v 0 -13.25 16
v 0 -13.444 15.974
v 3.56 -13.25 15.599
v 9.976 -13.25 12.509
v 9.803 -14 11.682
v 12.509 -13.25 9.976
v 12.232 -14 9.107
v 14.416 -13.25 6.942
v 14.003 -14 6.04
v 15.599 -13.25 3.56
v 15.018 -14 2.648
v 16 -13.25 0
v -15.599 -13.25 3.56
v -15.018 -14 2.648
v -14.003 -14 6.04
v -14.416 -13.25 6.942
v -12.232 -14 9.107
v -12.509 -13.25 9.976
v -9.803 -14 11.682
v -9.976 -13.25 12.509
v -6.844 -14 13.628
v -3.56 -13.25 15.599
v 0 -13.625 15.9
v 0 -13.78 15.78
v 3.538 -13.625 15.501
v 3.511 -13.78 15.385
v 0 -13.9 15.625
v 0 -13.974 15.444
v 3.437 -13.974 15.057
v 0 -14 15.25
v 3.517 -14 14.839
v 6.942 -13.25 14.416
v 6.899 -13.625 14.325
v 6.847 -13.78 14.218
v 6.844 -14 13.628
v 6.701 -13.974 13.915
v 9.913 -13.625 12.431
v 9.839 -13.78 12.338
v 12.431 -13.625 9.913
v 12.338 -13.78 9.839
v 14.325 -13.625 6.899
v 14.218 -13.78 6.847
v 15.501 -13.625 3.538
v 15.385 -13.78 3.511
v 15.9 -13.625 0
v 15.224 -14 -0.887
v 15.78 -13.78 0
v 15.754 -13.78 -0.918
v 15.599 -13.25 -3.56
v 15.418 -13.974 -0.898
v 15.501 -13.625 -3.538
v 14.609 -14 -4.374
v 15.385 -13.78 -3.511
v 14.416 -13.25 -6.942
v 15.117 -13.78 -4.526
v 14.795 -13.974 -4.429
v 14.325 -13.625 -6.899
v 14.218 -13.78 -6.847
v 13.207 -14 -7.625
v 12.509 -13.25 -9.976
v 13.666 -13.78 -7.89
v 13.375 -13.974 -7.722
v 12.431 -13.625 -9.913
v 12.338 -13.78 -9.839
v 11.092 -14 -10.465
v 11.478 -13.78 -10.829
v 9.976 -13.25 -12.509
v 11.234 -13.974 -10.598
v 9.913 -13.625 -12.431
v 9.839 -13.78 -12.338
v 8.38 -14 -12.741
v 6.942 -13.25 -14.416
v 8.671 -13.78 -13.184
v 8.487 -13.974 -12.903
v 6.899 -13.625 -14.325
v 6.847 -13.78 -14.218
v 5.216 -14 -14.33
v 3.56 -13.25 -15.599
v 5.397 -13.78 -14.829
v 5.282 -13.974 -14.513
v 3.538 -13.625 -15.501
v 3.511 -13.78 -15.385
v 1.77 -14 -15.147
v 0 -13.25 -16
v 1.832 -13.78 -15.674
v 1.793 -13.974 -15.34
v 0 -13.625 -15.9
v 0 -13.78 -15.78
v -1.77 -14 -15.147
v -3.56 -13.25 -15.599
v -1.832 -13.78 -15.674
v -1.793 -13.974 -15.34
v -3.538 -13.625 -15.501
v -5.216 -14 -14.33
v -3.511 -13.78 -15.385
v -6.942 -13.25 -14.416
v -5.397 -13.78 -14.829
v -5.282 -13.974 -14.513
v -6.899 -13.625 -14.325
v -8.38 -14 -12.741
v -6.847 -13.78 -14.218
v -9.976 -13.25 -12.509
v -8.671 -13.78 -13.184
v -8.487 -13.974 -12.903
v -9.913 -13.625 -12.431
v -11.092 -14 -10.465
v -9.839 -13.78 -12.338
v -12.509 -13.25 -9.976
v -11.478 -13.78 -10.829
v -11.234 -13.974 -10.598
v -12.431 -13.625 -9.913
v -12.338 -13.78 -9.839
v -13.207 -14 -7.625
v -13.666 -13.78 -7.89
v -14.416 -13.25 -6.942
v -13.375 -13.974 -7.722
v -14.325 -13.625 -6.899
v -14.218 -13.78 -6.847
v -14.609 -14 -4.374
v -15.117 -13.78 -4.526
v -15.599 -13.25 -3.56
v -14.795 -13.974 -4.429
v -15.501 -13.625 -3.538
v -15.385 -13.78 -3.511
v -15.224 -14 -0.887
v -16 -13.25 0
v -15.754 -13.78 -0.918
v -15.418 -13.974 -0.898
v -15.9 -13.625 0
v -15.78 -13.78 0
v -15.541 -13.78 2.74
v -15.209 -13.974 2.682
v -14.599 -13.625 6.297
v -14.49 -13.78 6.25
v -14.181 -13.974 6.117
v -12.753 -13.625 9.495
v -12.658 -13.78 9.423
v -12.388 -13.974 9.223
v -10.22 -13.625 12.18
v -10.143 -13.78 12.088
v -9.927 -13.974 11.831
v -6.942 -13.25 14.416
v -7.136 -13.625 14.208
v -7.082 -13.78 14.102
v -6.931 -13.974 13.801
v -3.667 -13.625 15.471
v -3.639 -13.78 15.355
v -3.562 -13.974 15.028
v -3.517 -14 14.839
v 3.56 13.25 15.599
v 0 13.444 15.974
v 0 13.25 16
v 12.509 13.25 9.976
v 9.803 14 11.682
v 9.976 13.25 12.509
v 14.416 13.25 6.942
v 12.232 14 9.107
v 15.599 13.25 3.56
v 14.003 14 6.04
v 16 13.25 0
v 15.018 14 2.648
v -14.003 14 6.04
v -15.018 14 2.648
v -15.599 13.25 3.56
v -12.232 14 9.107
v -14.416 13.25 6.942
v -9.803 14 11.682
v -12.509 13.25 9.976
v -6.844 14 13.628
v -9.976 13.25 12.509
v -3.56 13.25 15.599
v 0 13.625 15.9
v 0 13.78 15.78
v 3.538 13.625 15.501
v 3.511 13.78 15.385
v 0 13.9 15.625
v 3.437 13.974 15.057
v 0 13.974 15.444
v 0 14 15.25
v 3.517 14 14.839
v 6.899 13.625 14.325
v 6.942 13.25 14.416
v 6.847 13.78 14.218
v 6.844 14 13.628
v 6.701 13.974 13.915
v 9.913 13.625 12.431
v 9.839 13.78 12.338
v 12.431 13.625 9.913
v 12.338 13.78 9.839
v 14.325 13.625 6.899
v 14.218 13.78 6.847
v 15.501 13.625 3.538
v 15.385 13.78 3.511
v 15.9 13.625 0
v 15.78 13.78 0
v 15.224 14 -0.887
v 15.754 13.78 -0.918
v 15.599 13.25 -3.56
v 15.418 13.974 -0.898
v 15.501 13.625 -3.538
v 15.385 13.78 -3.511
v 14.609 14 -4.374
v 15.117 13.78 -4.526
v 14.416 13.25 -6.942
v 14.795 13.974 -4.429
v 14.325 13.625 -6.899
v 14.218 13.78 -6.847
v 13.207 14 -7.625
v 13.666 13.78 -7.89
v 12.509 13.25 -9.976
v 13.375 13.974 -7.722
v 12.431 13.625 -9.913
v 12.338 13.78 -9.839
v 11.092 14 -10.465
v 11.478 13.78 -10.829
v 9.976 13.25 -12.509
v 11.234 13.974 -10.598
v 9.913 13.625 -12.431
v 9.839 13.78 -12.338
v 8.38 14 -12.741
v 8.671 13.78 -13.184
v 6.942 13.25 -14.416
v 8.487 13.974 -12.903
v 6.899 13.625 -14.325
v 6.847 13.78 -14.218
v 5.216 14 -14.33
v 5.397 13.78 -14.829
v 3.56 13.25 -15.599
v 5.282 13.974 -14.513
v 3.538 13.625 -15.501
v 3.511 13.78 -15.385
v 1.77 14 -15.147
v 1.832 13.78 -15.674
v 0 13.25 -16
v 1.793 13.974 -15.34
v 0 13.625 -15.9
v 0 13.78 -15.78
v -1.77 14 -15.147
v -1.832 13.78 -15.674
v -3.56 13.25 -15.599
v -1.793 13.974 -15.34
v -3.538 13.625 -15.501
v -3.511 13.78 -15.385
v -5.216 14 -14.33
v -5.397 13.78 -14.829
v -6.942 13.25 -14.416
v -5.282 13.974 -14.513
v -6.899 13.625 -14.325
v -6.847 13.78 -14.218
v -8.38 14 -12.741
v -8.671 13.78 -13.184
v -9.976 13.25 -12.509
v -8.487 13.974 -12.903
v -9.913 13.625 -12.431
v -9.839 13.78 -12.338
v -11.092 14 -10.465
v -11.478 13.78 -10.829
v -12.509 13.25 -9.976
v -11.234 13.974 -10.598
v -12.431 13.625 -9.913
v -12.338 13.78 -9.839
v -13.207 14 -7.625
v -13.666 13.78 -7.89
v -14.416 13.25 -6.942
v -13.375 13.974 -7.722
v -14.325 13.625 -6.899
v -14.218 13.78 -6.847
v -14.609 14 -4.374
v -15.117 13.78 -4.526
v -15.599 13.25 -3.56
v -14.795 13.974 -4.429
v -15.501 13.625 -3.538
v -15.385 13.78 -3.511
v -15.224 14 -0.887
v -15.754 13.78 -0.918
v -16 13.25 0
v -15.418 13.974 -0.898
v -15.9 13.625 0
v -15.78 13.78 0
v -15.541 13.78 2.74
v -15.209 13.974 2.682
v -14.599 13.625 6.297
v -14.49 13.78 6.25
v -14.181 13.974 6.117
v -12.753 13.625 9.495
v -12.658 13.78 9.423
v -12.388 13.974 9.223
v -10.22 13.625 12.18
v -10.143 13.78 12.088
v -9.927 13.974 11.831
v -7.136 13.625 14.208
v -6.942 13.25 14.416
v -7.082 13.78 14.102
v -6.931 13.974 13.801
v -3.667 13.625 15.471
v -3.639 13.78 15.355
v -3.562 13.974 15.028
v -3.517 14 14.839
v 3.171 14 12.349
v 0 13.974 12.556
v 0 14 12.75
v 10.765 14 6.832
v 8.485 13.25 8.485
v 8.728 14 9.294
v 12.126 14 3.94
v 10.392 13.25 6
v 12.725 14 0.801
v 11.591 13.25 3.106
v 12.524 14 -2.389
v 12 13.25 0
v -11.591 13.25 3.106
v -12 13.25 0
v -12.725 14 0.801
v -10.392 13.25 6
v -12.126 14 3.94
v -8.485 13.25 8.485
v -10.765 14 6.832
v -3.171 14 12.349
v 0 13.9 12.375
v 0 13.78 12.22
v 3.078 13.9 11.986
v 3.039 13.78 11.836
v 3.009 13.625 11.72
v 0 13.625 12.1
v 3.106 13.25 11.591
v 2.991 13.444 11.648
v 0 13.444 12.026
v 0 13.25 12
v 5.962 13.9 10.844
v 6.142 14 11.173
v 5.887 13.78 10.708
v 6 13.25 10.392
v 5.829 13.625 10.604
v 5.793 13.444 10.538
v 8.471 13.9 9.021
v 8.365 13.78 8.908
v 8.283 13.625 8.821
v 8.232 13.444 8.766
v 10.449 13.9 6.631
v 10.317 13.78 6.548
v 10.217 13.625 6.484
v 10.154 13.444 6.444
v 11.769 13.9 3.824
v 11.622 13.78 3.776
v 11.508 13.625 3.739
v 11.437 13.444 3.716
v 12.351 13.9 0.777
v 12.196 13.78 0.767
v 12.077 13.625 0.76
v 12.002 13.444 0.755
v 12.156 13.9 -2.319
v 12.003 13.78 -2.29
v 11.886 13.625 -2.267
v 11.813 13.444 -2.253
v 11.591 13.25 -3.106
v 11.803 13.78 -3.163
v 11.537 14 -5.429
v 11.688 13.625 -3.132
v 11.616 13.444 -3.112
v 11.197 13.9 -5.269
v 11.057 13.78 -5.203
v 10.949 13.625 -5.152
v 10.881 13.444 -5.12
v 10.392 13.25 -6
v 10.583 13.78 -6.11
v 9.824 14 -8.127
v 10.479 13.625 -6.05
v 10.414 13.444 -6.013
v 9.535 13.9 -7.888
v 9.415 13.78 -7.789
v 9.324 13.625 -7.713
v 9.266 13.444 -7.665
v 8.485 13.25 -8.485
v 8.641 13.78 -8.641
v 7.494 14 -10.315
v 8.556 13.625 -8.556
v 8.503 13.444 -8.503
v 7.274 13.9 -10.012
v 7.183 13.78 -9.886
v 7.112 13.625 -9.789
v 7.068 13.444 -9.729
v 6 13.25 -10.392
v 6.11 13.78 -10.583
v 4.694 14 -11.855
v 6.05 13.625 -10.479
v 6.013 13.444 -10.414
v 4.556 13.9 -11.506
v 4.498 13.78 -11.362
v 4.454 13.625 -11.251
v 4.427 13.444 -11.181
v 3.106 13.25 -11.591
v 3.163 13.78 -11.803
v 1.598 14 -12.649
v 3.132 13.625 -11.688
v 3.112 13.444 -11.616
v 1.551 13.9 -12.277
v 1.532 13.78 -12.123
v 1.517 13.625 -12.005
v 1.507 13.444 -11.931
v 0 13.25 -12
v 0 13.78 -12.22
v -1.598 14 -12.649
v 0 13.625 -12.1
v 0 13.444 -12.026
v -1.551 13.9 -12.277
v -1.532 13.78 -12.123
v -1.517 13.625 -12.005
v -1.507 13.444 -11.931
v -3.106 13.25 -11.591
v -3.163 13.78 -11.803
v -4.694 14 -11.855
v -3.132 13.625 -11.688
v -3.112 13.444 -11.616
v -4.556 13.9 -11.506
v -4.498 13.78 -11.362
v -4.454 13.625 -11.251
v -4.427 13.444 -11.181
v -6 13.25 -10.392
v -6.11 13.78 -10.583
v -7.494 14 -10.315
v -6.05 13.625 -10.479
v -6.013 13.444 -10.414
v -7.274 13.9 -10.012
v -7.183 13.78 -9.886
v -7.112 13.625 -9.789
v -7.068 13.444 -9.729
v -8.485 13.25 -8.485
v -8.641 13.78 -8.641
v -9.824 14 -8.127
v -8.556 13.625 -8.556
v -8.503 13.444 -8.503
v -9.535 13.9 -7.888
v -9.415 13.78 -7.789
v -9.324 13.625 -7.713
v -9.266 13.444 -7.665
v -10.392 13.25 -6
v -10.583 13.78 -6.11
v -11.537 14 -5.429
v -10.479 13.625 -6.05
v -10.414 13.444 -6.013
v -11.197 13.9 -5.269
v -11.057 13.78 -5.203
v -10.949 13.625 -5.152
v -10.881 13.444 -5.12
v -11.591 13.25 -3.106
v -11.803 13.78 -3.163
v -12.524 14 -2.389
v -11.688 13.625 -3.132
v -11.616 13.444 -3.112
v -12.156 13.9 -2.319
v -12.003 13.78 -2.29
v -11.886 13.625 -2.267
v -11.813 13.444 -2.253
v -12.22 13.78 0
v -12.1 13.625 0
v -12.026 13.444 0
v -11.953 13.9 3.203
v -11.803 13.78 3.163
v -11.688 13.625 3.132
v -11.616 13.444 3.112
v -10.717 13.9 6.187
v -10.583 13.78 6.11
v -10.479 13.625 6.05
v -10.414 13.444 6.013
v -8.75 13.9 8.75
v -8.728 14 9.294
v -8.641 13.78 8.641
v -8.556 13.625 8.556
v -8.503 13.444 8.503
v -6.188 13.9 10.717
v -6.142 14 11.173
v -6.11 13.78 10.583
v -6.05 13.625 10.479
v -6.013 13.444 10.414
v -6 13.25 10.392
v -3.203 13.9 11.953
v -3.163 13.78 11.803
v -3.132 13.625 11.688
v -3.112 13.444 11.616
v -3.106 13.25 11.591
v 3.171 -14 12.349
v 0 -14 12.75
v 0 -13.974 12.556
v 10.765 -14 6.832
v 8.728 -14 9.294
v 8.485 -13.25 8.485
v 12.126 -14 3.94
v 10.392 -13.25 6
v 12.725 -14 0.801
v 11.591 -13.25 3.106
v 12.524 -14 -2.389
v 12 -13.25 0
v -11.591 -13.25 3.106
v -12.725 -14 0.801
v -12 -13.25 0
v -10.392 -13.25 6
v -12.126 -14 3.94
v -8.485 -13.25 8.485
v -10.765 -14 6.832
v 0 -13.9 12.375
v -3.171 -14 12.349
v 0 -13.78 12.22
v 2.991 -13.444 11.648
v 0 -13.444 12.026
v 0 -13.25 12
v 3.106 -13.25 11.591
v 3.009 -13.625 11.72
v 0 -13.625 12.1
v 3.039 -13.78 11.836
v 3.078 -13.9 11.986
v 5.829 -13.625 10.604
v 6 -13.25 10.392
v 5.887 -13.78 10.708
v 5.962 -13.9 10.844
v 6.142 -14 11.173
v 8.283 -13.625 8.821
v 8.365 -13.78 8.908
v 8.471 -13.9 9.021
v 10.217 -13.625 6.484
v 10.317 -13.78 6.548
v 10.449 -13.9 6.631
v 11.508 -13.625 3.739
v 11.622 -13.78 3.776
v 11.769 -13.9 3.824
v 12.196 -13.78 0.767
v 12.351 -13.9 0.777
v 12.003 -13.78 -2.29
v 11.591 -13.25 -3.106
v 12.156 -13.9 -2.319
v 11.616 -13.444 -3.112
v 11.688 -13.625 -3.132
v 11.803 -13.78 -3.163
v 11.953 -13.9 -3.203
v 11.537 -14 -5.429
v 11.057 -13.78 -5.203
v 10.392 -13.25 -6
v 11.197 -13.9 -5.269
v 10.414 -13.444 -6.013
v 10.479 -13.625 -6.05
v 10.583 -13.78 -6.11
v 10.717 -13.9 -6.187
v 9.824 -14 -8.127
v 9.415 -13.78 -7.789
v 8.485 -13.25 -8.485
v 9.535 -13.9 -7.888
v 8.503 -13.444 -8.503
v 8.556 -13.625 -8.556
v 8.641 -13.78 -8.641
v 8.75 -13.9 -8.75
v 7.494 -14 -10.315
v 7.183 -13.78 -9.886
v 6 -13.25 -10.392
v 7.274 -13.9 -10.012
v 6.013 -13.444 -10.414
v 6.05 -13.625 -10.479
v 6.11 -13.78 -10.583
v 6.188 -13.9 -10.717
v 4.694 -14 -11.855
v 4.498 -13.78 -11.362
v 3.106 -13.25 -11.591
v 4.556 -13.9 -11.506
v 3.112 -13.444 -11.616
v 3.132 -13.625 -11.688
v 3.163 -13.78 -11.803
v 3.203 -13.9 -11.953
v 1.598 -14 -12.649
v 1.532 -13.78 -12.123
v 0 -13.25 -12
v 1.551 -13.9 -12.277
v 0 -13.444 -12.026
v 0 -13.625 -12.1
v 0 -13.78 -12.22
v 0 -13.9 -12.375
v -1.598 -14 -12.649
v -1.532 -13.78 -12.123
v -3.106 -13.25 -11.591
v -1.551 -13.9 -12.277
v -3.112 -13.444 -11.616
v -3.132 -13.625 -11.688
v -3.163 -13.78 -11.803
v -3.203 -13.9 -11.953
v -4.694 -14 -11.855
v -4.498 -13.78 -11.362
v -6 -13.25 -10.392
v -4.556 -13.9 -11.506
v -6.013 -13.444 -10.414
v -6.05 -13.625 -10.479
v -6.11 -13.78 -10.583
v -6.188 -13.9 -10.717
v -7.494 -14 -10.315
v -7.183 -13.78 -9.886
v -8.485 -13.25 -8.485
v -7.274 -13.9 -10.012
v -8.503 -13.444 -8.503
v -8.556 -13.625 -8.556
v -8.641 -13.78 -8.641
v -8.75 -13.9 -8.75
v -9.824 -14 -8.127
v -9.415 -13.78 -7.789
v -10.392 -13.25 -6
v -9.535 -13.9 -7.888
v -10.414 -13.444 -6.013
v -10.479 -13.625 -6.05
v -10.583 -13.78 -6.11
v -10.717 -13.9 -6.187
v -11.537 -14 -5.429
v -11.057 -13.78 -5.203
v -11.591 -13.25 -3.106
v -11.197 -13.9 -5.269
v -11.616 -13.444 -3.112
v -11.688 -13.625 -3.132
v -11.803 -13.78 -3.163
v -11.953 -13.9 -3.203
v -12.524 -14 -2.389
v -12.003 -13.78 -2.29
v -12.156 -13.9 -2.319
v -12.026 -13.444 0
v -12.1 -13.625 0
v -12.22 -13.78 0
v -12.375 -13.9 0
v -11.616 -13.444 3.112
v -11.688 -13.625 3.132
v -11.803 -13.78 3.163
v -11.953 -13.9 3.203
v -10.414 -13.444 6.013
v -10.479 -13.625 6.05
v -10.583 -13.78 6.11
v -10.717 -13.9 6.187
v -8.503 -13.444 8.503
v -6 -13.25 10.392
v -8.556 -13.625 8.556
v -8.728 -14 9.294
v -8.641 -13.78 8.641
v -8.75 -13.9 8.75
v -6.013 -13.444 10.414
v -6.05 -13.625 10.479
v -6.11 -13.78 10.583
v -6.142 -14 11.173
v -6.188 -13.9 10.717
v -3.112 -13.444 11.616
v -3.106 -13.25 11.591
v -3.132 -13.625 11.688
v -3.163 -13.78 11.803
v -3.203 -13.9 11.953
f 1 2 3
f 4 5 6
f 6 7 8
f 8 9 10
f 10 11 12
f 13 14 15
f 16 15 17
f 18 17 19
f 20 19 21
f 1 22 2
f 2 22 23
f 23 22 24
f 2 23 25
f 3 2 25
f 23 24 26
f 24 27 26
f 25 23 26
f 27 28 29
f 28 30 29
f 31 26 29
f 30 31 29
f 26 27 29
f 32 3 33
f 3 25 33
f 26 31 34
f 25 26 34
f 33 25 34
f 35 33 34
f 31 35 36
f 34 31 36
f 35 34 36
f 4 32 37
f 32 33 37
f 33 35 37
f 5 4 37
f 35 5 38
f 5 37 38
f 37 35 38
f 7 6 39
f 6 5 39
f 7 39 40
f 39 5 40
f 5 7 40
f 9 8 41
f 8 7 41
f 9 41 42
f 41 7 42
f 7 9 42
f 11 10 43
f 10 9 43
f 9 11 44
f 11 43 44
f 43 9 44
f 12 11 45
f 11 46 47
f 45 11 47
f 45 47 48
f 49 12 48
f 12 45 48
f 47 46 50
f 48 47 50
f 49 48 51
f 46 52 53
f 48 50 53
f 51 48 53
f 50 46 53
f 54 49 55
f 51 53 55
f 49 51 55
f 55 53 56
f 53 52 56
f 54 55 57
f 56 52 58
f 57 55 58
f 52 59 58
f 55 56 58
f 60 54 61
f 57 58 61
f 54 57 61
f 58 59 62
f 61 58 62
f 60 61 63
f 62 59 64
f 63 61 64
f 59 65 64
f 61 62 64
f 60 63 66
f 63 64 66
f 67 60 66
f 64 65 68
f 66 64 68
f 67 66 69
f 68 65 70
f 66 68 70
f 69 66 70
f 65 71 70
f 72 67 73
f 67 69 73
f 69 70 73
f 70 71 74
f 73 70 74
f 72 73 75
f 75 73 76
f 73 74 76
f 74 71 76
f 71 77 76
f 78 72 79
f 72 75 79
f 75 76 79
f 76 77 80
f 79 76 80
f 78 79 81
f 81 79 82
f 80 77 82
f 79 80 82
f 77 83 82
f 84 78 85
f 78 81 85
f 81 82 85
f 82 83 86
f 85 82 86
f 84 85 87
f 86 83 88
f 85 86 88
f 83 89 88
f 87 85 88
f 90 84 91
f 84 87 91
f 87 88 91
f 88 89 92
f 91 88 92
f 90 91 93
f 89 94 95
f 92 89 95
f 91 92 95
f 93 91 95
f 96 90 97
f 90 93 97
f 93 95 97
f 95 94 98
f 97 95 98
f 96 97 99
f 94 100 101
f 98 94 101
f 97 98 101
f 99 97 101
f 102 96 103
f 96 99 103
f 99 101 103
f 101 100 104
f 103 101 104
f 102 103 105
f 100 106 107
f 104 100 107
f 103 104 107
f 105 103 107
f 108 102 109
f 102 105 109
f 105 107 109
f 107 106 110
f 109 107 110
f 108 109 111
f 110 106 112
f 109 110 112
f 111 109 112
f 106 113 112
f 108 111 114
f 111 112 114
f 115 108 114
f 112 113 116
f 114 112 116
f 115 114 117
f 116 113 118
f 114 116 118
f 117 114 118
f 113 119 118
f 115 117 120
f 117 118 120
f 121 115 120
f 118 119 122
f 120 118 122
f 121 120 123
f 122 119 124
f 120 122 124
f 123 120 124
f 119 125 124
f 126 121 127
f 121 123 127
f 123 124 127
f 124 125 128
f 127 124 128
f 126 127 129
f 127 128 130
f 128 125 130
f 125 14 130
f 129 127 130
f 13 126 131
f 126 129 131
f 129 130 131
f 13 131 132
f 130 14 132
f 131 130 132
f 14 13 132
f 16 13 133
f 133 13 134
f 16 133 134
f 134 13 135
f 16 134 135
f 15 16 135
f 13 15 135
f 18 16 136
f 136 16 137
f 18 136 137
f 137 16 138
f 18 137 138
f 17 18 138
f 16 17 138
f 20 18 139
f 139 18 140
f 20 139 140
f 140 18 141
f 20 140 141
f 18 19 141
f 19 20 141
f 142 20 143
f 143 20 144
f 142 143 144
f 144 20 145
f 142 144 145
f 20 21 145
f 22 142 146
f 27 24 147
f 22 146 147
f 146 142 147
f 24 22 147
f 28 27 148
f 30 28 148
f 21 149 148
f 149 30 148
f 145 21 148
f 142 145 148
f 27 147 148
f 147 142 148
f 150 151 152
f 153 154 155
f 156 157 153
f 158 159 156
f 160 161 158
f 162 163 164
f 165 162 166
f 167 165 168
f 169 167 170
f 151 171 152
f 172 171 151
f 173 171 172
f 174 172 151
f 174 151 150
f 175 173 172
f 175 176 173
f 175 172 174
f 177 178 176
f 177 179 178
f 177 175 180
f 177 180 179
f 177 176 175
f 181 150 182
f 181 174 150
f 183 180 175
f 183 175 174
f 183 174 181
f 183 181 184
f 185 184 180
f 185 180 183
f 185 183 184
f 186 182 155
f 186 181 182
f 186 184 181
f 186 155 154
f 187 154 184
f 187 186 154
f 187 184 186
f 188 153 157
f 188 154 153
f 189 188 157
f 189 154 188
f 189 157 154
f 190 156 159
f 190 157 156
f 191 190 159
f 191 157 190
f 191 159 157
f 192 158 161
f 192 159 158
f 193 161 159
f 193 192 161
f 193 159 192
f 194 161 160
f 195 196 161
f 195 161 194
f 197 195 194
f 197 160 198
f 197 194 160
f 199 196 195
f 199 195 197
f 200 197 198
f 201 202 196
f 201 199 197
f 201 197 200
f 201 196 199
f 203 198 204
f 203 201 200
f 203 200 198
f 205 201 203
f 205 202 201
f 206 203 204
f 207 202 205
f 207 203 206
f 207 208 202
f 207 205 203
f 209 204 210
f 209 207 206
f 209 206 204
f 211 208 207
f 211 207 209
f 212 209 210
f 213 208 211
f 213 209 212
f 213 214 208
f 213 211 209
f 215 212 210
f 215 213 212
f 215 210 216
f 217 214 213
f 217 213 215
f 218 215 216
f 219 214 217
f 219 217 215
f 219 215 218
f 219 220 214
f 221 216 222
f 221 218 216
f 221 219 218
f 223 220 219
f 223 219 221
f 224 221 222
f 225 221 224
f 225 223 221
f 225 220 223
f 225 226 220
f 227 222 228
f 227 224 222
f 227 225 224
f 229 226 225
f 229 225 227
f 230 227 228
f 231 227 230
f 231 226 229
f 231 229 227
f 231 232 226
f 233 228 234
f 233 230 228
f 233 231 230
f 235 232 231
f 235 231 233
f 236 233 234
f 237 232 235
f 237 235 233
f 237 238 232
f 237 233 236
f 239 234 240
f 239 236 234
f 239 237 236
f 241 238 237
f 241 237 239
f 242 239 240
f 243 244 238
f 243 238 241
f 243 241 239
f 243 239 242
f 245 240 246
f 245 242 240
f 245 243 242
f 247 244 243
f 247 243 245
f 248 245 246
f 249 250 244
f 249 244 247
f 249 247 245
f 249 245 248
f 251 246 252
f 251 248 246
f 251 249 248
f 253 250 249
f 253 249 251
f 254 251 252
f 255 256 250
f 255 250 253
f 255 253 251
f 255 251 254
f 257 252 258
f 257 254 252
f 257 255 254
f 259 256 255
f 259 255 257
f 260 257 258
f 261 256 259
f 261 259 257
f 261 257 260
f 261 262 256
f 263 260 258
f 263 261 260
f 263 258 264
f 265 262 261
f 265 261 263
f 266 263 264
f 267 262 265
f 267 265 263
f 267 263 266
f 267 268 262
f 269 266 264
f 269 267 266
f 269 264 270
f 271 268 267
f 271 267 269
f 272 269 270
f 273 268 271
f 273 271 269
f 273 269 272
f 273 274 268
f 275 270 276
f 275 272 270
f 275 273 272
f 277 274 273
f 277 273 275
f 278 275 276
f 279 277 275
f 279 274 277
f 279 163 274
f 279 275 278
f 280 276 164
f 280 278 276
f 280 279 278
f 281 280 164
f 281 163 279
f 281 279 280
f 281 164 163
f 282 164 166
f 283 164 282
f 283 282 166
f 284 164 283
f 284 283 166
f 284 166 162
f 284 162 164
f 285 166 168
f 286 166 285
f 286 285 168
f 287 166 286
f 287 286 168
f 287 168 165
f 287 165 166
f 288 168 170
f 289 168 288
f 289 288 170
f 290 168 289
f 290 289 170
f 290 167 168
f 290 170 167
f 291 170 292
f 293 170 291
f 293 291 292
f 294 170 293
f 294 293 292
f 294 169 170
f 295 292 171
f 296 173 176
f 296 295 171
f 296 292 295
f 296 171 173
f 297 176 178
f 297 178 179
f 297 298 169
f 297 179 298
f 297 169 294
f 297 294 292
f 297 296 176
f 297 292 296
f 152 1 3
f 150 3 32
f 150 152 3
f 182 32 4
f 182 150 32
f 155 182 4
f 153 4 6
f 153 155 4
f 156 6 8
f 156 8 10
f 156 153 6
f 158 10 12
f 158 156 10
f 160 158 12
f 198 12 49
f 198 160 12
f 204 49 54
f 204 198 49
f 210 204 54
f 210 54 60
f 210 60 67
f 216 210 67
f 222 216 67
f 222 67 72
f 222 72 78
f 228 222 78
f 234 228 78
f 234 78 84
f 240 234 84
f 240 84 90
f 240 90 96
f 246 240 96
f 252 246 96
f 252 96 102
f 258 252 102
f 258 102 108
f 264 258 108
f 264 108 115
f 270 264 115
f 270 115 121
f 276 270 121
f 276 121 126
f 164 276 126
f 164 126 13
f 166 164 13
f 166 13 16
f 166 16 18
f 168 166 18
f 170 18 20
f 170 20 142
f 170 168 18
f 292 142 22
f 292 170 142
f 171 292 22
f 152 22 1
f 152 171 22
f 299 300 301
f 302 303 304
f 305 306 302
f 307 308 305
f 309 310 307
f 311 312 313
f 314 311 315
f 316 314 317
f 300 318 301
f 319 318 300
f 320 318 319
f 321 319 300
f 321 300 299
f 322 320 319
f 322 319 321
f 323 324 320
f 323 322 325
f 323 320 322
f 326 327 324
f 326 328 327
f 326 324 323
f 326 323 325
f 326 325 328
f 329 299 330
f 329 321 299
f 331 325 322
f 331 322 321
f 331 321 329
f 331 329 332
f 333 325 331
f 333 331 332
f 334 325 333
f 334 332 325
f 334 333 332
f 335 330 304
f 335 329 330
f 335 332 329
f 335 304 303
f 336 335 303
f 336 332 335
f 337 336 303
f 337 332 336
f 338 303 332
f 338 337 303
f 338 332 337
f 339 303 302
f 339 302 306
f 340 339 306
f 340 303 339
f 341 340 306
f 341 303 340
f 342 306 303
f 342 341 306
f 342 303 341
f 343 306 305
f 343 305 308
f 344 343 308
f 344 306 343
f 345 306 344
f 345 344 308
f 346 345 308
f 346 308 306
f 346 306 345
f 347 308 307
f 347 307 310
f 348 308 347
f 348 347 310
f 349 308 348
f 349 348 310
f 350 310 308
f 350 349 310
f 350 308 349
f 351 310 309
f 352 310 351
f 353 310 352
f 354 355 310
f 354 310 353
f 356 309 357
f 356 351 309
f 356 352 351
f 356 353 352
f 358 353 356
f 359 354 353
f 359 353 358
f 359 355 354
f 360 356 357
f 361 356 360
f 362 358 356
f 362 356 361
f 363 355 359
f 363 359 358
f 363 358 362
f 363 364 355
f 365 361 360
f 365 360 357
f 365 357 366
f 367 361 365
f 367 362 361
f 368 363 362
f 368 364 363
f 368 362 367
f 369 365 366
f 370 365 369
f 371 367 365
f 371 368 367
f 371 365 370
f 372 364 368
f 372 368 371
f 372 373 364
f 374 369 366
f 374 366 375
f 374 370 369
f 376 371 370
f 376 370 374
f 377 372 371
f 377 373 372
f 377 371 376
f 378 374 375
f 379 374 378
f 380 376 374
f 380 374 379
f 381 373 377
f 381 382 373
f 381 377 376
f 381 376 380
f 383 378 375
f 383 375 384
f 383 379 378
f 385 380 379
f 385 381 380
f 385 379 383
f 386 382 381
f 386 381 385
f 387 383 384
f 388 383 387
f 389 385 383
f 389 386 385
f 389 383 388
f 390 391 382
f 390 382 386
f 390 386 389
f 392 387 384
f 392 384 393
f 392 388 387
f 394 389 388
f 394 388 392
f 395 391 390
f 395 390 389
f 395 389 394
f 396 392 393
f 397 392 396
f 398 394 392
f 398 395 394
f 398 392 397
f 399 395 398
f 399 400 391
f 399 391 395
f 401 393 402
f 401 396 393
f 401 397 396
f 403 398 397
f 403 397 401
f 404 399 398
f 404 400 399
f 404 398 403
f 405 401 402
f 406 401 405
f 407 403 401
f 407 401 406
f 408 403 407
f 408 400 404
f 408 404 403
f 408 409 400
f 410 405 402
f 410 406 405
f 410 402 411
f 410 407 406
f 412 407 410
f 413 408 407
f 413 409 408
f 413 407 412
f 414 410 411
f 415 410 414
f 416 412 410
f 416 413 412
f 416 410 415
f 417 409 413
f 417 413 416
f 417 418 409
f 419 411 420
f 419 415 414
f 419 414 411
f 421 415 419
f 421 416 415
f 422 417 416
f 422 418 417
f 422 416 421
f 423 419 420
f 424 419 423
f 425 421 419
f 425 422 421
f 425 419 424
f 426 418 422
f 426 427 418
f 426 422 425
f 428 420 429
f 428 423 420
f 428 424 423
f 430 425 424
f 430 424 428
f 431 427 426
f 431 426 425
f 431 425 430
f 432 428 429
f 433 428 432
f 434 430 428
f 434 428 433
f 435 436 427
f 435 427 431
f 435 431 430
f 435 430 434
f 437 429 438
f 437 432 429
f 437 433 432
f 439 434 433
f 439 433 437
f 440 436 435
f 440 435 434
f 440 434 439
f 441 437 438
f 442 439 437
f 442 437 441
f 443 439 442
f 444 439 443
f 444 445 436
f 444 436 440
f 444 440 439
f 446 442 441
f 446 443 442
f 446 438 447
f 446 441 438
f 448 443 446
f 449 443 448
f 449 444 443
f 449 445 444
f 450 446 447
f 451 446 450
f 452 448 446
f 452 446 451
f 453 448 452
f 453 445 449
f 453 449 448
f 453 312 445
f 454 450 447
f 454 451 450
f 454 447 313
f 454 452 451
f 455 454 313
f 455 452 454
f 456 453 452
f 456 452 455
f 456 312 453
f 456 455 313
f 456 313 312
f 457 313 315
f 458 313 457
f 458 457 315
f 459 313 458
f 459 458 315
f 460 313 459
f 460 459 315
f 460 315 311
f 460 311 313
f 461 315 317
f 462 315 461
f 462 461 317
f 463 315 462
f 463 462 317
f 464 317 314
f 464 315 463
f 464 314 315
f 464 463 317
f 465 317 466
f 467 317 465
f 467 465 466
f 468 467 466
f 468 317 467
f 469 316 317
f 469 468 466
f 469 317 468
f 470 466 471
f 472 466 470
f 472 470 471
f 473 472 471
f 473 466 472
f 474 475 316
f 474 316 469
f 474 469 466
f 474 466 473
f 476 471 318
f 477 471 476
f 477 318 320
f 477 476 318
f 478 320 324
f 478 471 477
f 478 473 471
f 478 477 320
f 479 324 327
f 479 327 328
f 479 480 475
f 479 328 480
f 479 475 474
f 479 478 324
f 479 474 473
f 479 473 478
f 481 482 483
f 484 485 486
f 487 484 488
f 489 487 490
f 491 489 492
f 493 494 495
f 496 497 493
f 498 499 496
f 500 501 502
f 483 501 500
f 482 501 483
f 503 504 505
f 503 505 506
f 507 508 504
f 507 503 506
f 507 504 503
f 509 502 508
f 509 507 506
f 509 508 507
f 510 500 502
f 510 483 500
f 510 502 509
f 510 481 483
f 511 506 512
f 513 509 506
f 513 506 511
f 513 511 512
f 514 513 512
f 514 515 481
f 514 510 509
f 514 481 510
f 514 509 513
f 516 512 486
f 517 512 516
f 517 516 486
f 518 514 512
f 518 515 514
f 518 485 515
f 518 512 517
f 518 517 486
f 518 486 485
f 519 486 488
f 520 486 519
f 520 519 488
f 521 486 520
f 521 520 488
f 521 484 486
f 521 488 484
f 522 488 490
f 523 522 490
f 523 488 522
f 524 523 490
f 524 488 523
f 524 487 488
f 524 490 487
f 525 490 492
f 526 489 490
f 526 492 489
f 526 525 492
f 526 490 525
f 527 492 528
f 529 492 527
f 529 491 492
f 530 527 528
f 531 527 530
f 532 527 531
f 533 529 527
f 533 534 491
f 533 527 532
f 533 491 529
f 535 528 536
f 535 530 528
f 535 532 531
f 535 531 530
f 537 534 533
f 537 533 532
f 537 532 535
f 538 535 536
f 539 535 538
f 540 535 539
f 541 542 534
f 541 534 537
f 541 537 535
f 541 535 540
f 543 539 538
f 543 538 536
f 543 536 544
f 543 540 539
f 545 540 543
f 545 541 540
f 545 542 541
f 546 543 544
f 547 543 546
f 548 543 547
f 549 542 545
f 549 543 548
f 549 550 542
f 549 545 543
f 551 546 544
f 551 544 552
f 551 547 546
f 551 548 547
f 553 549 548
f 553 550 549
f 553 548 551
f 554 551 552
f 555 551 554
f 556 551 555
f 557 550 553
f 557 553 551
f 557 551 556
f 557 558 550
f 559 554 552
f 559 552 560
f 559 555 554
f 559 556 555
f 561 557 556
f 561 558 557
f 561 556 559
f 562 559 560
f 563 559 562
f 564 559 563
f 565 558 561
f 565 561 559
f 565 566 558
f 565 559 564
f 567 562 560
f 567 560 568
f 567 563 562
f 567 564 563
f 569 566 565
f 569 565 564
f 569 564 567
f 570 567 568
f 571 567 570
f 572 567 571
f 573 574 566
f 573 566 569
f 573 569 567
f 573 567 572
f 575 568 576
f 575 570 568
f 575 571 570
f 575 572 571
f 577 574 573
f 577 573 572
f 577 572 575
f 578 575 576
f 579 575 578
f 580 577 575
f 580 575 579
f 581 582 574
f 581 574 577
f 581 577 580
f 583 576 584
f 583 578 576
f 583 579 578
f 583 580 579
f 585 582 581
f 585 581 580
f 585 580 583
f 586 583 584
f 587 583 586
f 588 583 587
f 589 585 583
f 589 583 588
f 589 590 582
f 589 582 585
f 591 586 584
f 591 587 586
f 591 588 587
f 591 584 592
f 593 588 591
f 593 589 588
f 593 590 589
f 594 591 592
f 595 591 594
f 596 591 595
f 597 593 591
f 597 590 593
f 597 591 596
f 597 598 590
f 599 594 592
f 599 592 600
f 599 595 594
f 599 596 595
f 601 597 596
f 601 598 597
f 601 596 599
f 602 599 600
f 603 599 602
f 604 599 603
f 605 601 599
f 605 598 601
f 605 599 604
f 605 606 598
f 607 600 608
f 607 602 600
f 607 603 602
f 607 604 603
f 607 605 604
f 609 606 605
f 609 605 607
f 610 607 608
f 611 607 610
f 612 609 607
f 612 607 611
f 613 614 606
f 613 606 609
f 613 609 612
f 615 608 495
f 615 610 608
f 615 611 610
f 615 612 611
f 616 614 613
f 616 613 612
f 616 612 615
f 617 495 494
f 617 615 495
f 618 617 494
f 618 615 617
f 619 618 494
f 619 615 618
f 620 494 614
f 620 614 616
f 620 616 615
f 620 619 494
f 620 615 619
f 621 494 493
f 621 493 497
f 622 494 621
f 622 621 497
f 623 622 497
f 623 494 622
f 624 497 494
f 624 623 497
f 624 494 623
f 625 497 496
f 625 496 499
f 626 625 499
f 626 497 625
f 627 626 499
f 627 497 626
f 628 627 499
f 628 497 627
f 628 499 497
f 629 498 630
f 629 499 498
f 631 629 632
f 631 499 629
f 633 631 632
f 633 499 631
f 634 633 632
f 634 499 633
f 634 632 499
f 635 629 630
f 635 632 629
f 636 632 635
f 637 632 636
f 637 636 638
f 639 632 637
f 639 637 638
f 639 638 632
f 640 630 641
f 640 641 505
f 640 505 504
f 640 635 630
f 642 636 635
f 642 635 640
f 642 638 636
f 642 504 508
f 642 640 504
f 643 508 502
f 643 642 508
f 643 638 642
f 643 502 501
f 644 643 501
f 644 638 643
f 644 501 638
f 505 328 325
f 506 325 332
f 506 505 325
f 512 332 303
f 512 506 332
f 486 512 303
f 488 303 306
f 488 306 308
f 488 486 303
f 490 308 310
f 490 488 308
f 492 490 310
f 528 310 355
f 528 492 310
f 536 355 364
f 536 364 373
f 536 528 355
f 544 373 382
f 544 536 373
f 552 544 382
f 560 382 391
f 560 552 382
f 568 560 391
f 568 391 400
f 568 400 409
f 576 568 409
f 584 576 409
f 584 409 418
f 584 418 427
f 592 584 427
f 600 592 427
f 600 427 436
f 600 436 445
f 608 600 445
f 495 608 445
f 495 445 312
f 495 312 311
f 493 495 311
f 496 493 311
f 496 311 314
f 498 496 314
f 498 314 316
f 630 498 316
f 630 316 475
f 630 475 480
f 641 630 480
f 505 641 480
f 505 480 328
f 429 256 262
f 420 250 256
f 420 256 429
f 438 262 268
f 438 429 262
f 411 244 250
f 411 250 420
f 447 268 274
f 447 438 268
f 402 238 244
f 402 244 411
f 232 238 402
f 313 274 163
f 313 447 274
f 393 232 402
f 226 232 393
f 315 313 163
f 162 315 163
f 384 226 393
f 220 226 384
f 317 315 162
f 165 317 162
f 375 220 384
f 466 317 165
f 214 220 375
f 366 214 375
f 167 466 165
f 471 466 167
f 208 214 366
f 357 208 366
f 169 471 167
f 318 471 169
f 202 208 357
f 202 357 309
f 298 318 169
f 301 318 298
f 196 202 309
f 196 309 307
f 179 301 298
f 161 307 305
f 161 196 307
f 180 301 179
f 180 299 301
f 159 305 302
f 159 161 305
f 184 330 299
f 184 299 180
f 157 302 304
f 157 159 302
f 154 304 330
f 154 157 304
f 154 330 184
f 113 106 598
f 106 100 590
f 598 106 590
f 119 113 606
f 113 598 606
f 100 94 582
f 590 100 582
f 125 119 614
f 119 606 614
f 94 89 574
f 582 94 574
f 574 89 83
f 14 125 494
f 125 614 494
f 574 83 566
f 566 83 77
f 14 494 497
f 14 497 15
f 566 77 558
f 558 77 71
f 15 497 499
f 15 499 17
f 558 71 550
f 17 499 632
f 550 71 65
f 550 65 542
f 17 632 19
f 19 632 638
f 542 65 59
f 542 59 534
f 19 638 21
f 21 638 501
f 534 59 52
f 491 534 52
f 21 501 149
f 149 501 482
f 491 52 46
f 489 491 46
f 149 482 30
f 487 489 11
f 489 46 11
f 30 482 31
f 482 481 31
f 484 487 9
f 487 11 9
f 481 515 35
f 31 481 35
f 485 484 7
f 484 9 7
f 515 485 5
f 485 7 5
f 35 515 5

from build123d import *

# Parameters (mm, degrees)
SKETCH_1_R      = 16
SKETCH_1_R_2    = 12
EXTRUDE_1_DEPTH = 14
FILLET_1_R      = 0.75


with BuildPart() as part:
    # 草图1 → 凸台-拉伸1 (new, symmetric)
    with BuildSketch(Plane(origin=(0, 0, 0), x_dir=(1, 0, 0), z_dir=(0, 1, 0))):
        with Locations(Location((0, 0, 0), (0, 0, 270))):
            Circle(SKETCH_1_R)
        with Locations(Location((0, 0, 0), (0, 0, 270))):
            Circle(SKETCH_1_R_2, mode=Mode.SUBTRACT)
    extrude(amount=EXTRUDE_1_DEPTH, both=True)

    # 圆角1
    fillet_1_edges = [part.edges().sort_by_distance(p)[0] for p in [
        (0, -14, -16),
        (0, 14, -16),
        (0, -14, -12),
        (0, 14, -12),
    ]]
    fillet(fillet_1_edges, radius=FILLET_1_R)


solid = part.part
